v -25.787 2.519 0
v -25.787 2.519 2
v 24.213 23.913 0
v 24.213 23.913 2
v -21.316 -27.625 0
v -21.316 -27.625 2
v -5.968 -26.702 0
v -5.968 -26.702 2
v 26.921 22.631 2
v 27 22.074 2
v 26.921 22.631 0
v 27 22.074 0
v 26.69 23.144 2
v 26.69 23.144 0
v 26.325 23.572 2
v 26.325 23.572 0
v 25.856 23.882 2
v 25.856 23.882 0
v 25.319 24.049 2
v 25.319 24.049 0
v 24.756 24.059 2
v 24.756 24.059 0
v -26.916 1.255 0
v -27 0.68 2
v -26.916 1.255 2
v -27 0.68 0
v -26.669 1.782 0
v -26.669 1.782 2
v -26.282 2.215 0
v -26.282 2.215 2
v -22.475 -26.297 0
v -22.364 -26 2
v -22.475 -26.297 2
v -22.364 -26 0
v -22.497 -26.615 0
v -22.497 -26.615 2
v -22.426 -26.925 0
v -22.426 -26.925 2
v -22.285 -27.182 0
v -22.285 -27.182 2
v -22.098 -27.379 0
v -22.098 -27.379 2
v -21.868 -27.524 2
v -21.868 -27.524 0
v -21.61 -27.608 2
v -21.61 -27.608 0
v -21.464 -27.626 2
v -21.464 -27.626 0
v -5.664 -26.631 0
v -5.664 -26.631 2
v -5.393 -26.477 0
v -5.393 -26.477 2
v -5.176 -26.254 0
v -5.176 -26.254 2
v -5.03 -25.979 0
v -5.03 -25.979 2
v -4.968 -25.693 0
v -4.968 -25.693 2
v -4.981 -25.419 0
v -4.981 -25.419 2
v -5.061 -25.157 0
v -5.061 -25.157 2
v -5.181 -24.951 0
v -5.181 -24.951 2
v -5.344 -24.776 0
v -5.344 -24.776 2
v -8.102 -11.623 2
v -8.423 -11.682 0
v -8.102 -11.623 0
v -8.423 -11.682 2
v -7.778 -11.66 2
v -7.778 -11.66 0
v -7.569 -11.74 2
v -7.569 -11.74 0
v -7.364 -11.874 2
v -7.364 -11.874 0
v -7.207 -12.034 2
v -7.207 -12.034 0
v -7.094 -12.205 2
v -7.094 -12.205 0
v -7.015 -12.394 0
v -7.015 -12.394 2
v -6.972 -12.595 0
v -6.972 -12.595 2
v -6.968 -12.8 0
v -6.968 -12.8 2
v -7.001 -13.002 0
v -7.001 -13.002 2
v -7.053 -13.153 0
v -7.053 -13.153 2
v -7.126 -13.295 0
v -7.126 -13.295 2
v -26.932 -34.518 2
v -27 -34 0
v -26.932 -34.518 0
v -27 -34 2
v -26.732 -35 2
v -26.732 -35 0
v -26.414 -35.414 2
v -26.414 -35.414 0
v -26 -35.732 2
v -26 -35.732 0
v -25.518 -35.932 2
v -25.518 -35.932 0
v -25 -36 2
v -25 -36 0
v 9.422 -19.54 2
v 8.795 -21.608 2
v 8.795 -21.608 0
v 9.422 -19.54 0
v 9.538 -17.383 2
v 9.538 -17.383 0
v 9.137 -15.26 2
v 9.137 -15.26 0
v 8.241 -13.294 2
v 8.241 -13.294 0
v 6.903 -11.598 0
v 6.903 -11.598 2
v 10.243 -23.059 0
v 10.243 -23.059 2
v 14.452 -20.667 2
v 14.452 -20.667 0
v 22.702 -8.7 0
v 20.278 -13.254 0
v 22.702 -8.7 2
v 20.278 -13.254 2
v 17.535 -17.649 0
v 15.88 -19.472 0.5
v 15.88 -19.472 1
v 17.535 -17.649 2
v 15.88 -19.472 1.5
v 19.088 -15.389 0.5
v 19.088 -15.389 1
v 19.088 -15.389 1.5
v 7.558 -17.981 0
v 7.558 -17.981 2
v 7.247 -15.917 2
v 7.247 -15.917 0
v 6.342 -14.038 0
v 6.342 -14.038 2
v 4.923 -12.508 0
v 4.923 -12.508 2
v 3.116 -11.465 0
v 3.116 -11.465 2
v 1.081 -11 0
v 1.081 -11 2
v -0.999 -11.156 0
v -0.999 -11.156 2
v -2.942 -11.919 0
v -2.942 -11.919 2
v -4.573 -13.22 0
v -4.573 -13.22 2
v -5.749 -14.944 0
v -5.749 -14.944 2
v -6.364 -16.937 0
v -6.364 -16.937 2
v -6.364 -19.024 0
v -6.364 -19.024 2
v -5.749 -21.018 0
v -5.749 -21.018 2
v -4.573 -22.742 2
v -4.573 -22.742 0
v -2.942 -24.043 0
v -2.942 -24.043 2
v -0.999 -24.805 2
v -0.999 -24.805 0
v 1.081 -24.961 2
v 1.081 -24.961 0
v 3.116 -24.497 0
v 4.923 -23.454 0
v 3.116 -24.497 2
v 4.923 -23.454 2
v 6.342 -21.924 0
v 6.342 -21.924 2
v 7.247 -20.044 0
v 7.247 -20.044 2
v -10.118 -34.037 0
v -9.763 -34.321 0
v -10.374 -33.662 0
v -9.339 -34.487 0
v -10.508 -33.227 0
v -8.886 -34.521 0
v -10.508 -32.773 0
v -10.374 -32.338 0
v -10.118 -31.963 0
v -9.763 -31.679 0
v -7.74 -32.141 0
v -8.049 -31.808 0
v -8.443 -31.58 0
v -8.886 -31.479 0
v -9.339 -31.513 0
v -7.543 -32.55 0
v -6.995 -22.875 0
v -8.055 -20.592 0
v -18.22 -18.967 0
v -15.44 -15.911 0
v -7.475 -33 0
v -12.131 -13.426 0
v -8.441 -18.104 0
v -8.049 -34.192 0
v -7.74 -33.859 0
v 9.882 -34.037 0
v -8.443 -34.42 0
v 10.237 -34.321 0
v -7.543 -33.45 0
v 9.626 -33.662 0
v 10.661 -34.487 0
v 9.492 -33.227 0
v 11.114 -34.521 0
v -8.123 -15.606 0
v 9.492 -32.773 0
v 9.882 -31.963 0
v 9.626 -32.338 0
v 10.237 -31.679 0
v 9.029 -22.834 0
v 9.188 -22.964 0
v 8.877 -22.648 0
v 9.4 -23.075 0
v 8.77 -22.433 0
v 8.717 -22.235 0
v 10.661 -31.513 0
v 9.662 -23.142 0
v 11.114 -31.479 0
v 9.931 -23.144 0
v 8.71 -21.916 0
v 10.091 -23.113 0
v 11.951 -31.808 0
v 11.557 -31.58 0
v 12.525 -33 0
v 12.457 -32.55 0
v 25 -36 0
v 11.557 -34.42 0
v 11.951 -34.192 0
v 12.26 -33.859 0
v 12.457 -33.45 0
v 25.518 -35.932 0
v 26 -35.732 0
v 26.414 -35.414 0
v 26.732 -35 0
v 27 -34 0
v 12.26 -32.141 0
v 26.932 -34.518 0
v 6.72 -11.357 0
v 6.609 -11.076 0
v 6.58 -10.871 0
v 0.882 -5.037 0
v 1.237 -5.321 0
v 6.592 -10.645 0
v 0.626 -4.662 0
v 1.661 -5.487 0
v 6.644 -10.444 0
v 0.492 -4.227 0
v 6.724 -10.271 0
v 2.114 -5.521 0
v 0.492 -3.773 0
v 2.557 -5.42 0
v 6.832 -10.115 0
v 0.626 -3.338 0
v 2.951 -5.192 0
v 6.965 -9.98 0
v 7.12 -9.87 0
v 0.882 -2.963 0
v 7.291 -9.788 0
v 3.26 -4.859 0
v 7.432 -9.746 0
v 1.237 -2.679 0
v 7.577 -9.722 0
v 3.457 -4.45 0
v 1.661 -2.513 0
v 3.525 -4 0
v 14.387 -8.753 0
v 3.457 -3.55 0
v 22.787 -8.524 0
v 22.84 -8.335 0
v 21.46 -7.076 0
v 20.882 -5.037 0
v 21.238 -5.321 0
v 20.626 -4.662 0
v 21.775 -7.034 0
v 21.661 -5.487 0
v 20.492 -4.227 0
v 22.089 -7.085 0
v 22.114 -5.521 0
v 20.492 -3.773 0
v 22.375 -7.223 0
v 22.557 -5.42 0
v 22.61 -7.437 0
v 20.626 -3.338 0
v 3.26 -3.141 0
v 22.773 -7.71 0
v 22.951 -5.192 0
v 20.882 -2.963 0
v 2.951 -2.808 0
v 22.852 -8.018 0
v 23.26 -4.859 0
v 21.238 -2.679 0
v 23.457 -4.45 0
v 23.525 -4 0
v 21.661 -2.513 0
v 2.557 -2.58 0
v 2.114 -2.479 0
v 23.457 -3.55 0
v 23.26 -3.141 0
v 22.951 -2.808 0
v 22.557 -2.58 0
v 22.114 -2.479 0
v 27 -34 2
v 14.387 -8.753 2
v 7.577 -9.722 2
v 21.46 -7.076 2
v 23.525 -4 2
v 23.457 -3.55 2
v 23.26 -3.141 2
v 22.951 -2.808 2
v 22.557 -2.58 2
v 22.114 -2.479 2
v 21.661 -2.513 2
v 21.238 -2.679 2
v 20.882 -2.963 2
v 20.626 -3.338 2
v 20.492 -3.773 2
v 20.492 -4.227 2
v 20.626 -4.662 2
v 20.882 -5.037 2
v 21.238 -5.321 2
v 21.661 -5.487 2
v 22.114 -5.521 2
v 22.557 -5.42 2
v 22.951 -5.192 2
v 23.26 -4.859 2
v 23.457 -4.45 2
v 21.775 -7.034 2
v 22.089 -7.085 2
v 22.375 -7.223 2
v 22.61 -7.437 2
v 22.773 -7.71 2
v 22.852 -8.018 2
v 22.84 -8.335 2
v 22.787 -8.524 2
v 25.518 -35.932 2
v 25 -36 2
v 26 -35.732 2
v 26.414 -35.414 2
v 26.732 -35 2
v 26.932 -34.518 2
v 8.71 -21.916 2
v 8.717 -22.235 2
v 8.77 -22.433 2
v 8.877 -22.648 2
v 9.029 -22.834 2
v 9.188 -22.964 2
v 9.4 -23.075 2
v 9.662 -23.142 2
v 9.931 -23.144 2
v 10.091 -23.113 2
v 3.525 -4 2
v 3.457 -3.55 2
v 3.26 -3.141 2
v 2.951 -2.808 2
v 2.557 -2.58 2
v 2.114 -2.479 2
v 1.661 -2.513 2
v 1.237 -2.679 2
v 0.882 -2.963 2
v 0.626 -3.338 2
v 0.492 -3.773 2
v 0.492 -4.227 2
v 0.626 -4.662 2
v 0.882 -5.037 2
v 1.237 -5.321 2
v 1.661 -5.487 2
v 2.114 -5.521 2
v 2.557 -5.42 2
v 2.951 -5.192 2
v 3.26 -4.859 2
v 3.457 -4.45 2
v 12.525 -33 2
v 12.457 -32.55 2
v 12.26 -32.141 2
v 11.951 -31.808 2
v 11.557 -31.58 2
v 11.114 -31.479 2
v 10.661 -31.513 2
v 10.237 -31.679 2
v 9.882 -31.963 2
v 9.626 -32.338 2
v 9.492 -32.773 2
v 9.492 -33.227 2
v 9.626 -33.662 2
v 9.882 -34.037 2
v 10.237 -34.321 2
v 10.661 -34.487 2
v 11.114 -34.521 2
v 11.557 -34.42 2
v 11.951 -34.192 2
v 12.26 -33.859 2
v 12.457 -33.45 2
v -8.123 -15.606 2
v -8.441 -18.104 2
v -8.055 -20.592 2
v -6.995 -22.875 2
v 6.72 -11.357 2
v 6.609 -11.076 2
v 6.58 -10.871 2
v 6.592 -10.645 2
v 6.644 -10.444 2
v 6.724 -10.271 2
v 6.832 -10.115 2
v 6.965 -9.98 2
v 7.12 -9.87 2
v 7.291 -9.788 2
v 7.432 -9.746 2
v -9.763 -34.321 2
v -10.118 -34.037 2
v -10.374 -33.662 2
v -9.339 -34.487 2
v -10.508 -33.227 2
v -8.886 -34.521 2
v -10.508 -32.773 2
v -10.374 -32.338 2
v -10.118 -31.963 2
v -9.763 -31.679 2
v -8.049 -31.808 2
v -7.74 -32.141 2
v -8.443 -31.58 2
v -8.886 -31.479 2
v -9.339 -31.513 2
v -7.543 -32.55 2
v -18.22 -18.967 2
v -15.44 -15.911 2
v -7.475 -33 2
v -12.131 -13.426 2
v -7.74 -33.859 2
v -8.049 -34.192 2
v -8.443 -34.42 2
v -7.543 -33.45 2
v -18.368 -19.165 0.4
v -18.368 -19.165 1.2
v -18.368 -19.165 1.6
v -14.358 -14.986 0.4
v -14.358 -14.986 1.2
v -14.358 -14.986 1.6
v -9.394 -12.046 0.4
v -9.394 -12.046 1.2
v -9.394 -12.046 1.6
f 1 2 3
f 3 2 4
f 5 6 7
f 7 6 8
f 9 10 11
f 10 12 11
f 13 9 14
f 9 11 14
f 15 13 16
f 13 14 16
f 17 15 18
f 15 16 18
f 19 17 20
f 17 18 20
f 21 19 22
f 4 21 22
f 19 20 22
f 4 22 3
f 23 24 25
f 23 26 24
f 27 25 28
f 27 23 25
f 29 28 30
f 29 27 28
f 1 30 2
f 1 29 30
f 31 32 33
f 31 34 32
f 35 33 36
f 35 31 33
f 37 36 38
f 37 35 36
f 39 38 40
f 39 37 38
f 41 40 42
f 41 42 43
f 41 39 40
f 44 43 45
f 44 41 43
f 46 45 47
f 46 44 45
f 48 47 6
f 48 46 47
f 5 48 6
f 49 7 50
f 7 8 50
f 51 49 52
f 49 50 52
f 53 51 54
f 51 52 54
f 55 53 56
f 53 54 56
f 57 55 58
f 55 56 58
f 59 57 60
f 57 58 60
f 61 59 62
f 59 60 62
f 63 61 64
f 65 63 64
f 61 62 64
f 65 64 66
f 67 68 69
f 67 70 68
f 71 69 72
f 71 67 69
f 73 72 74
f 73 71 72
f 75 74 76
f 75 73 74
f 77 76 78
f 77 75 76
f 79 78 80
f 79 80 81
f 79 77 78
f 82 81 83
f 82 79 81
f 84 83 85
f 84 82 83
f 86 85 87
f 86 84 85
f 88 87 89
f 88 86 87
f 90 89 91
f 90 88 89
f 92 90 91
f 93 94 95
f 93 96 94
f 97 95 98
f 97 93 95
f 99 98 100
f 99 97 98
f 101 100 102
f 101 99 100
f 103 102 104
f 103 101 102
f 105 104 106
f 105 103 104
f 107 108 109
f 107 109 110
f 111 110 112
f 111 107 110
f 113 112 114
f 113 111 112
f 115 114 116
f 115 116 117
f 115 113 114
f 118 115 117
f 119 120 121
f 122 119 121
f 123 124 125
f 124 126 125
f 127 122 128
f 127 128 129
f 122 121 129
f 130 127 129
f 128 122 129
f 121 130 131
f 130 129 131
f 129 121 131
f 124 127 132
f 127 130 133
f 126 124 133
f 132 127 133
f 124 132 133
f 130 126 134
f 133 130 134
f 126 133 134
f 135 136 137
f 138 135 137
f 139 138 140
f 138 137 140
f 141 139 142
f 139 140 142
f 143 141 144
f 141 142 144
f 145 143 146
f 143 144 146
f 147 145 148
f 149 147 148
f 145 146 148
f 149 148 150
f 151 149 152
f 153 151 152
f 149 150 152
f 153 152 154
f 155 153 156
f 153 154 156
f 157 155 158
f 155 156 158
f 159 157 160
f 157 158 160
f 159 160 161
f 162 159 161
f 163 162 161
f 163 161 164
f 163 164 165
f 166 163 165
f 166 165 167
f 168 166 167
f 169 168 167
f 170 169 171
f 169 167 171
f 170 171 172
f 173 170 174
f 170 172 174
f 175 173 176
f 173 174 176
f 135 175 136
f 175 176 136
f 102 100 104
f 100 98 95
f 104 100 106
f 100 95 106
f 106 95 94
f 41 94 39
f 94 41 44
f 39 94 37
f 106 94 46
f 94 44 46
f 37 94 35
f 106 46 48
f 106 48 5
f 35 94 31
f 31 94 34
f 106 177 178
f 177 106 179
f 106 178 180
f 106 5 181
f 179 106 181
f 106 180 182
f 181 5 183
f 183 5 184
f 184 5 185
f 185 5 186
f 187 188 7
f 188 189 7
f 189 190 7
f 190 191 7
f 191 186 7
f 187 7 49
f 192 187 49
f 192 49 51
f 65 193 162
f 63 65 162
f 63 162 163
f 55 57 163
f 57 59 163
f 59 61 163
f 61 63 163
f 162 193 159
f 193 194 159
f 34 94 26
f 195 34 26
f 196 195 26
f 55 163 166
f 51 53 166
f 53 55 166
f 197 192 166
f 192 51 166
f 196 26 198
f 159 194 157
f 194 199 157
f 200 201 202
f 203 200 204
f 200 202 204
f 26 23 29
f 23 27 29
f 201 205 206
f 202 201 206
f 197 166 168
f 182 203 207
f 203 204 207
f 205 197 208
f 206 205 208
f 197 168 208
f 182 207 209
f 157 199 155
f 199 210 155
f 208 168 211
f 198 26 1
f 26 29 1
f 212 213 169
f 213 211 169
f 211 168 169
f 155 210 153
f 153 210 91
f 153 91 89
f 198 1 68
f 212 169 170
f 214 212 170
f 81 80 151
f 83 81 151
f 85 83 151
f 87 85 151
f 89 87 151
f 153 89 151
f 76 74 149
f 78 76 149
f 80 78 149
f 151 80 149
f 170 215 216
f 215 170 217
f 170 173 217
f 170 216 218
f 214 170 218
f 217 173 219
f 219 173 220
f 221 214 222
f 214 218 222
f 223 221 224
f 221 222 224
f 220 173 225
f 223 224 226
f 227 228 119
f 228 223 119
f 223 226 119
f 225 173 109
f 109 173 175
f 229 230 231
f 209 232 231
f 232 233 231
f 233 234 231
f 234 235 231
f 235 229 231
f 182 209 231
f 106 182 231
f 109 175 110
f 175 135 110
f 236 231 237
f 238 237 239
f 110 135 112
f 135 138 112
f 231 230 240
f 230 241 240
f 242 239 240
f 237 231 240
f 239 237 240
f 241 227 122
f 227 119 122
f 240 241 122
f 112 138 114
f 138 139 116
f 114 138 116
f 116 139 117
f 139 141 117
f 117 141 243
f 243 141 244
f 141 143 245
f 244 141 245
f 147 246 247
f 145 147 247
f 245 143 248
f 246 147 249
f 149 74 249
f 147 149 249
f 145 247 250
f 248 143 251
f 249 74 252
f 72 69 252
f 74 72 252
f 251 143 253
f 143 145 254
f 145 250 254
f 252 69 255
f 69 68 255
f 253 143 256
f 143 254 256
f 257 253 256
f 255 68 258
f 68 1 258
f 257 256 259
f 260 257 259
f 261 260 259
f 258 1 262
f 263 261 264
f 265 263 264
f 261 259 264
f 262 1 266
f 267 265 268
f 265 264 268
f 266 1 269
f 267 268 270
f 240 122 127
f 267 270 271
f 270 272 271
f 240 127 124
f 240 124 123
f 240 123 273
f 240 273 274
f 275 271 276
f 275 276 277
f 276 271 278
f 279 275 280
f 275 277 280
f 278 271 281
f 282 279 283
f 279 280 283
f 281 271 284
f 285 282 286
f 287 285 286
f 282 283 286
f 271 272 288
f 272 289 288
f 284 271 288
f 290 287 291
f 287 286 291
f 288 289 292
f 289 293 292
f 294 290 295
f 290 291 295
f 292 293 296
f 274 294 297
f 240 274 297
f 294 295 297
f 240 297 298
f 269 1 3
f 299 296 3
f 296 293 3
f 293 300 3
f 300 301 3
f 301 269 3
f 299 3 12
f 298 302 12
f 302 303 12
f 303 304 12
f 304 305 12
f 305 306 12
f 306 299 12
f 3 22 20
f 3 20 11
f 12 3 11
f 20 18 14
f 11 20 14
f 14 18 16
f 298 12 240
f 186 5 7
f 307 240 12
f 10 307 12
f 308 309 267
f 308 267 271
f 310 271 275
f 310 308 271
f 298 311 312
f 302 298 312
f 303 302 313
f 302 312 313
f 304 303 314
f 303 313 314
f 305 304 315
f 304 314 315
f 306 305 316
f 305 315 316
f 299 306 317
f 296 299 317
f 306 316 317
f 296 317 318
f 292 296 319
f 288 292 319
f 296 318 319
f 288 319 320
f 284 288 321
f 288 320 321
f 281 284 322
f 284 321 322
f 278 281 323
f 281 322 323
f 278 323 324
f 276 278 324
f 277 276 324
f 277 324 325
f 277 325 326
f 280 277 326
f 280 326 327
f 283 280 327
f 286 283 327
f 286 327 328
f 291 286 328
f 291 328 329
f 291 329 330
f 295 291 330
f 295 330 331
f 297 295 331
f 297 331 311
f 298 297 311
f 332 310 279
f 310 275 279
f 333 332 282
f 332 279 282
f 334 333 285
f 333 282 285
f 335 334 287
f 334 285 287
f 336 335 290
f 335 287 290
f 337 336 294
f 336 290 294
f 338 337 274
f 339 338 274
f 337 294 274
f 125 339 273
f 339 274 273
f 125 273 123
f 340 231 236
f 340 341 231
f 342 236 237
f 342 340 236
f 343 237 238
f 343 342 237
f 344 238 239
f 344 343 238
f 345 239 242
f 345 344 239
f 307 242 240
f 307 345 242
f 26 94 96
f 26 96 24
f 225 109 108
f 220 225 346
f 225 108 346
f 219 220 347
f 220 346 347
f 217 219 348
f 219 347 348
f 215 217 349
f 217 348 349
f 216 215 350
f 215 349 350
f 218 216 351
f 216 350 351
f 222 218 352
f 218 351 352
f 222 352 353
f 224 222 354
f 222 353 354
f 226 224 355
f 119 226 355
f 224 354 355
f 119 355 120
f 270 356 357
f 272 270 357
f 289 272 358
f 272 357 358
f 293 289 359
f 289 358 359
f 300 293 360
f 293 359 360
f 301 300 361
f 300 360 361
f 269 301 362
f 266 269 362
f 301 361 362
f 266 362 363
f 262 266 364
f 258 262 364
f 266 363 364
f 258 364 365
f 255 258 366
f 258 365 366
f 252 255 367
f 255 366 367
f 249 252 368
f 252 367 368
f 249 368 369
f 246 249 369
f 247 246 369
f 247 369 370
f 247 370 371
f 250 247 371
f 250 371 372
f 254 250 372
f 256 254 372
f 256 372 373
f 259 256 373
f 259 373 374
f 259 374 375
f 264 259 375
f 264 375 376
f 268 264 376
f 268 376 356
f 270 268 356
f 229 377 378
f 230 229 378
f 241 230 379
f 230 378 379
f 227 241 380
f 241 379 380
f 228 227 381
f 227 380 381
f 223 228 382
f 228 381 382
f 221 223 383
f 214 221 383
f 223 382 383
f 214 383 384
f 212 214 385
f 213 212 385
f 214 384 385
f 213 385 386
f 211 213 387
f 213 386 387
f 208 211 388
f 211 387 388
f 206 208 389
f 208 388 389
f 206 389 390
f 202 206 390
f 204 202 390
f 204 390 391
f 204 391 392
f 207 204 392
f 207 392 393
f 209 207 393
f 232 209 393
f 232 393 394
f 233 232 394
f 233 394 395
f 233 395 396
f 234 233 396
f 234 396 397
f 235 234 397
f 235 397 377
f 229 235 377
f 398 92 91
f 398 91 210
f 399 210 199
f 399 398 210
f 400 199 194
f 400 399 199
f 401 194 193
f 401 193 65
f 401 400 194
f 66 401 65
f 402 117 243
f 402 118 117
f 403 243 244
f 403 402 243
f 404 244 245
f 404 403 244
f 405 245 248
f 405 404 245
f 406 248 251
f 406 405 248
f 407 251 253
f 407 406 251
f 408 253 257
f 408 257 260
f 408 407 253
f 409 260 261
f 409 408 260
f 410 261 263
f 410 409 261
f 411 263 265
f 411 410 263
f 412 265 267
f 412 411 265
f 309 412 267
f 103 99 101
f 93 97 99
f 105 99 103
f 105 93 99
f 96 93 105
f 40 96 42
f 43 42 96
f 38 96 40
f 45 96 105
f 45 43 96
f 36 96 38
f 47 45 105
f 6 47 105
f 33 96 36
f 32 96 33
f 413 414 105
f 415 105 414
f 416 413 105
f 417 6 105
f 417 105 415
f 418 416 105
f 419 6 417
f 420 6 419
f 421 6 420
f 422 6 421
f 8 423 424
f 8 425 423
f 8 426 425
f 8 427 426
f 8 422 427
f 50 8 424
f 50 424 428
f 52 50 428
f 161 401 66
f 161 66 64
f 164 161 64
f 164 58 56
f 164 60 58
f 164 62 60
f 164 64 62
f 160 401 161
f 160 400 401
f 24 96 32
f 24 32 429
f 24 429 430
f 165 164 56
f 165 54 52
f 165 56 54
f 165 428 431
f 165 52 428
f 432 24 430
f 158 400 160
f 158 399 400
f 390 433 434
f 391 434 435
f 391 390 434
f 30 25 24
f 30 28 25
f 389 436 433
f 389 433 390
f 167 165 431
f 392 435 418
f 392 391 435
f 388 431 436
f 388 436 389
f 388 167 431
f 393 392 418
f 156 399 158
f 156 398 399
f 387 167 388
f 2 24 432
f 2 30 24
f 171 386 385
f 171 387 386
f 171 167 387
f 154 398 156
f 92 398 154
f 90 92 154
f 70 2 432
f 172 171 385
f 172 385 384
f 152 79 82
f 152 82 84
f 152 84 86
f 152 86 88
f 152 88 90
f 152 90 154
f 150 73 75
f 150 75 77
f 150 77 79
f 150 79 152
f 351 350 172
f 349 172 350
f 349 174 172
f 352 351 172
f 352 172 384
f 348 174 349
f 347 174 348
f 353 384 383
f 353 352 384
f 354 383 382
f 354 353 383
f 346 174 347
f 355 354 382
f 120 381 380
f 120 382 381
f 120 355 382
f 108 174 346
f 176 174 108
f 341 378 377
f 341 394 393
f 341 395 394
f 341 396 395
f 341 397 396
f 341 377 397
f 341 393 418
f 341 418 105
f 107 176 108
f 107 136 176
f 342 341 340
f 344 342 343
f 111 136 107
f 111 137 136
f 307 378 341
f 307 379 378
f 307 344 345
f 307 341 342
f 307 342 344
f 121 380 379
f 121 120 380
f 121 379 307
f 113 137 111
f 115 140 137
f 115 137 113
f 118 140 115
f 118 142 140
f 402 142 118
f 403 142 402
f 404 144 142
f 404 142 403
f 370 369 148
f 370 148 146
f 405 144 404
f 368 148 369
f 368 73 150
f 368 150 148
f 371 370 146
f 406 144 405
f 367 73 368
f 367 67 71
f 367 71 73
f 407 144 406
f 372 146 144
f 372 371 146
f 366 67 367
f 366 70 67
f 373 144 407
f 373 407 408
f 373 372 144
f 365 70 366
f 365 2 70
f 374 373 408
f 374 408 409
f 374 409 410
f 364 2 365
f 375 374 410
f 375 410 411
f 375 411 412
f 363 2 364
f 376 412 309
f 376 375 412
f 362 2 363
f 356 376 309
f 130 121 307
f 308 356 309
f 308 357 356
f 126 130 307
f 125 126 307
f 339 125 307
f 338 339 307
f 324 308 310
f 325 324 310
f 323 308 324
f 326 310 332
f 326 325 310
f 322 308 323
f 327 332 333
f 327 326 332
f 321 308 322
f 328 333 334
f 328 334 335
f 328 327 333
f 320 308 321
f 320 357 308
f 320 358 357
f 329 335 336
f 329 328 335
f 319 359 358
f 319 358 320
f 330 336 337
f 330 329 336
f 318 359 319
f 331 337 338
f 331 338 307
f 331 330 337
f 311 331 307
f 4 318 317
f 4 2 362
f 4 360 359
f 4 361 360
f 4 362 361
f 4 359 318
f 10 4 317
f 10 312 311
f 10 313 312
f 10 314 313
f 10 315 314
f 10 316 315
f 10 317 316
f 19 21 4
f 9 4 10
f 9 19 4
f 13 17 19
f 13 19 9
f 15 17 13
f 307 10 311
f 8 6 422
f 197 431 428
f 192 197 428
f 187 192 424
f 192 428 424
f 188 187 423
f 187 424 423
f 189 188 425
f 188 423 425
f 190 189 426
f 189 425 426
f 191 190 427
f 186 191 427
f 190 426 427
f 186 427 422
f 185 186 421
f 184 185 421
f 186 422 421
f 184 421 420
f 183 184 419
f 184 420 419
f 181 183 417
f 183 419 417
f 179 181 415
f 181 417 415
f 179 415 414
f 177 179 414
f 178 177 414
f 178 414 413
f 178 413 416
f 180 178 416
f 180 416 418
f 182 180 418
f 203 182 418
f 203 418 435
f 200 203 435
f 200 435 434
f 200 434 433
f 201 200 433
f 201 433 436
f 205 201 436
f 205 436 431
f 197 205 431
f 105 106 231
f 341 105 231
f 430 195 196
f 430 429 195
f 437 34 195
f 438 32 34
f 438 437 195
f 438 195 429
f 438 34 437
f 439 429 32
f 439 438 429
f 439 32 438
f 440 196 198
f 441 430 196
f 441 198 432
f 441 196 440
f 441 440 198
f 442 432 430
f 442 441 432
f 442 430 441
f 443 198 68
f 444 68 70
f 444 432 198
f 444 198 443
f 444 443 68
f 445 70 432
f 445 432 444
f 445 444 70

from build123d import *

# Parameters (mm, degrees)
SKETCH_1_W          = 54
SKETCH_1_H          = 72
EXTRUDE_1_DEPTH     = 2
CUT_EXTRUDE_1_DEPTH = 2
SKETCH_4_R          = 1.525
CUT_EXTRUDE_2_DEPTH = 10
CUT_EXTRUDE_3_DEPTH = 2
SKETCH_6_R          = 9
SKETCH_6_R_2        = 7
EXTRUDE_2_DEPTH     = 2
FILLET_1_R          = 1.1
FILLET_2_R          = 2


with BuildPart() as part:
    # 草图1 → 凸台-拉伸1 (new body)
    with BuildSketch(Plane.XY):
        Rectangle(SKETCH_1_W, SKETCH_1_H)
    extrude(amount=EXTRUDE_1_DEPTH)

    # 草图2 → 切除-拉伸1 (cut)
    with BuildSketch(Plane.XY.offset(2)):
        Polygon((-27, 2), (27, 25.105342179), (27, 36), (-27, 36), align=None)
    extrude(amount=-CUT_EXTRUDE_1_DEPTH, mode=Mode.SUBTRACT)

    # 草图4 → 切除-拉伸2 (cut)
    with BuildSketch(Plane.XY.offset(2)):
        with Locations((-9, -33)):
            Circle(SKETCH_4_R)
        with Locations((11, -33)):
            Circle(SKETCH_4_R)
        with Locations((2, -4)):
            Circle(SKETCH_4_R)
        with Locations((22, -4)):
            Circle(SKETCH_4_R)
    extrude(amount=-CUT_EXTRUDE_2_DEPTH, mode=Mode.SUBTRACT)

    # 草图5 → 切除-拉伸3 (cut)
    with BuildSketch(Plane.XY.offset(2)):
        with BuildLine():
            add(Edge.make_bspline(
                [(-23.397341502, -27.80348221), (-21.673234043, -24.952193686), (-18.841423513, -18.327485381), (-10.833901378, -11.756527748), (-1.499041268, -10.102711826), (9.981460044, -9.932321008), (18.81490672, -7.97288353), (24.483468669, -6.167126568)],
                knots=[0, 0, 0, 0, 0.178737613, 0.383542115, 0.520640135, 0.67991784, 1, 1, 1, 1], degree=3))
            add(Edge.make_bspline(
                [(-23.397341502, -27.80348221), (-13.158468218, -26.821678375), (0.76741254, -27.683363702), (15.176508339, -20.910209598), (20.355493831, -13.972924669), (22.163544803, -8.919372749), (24.483468669, -6.167126568)],
                knots=[0, 0, 0, 0, 0.548813094, 0.719371647, 0.81105697, 1, 1, 1, 1], degree=3))
        make_face()
    extrude(amount=-CUT_EXTRUDE_3_DEPTH, mode=Mode.SUBTRACT)

    # 草图6 → 凸台-拉伸2 (add)
    with BuildSketch(Plane.XY.offset(2)):
        with Locations((0.558156392, -17.980778356)):
            Circle(SKETCH_6_R)
        with Locations((0.558156392, -17.980778356)):
            Circle(SKETCH_6_R_2, mode=Mode.SUBTRACT)
    extrude(amount=-EXTRUDE_2_DEPTH)

    # 圆角1
    fillet_1_edges = [part.edges().sort_by_distance(p)[0] for p in [
        (6.982938033, -24.283331876, 1),
        (-2.733607094, -26.357191261, 1),
        (-23.397341502, -27.80348221, 1),
        (24.483468669, -6.167126568, 1),
        (-4.823851044, -10.767318995, 1),
        (4.597302123, -9.938061044, 1),
    ]]
    fillet(fillet_1_edges, radius=FILLET_1_R)

    # 圆角2
    fillet_2_edges = [part.edges().sort_by_distance(p)[0] for p in [
        (-27, 2, 1),
        (27, 25.105342179, 1),
        (27, -36, 1),
        (-27, -36, 1),
    ]]
    fillet(fillet_2_edges, radius=FILLET_2_R)


solid = part.part
